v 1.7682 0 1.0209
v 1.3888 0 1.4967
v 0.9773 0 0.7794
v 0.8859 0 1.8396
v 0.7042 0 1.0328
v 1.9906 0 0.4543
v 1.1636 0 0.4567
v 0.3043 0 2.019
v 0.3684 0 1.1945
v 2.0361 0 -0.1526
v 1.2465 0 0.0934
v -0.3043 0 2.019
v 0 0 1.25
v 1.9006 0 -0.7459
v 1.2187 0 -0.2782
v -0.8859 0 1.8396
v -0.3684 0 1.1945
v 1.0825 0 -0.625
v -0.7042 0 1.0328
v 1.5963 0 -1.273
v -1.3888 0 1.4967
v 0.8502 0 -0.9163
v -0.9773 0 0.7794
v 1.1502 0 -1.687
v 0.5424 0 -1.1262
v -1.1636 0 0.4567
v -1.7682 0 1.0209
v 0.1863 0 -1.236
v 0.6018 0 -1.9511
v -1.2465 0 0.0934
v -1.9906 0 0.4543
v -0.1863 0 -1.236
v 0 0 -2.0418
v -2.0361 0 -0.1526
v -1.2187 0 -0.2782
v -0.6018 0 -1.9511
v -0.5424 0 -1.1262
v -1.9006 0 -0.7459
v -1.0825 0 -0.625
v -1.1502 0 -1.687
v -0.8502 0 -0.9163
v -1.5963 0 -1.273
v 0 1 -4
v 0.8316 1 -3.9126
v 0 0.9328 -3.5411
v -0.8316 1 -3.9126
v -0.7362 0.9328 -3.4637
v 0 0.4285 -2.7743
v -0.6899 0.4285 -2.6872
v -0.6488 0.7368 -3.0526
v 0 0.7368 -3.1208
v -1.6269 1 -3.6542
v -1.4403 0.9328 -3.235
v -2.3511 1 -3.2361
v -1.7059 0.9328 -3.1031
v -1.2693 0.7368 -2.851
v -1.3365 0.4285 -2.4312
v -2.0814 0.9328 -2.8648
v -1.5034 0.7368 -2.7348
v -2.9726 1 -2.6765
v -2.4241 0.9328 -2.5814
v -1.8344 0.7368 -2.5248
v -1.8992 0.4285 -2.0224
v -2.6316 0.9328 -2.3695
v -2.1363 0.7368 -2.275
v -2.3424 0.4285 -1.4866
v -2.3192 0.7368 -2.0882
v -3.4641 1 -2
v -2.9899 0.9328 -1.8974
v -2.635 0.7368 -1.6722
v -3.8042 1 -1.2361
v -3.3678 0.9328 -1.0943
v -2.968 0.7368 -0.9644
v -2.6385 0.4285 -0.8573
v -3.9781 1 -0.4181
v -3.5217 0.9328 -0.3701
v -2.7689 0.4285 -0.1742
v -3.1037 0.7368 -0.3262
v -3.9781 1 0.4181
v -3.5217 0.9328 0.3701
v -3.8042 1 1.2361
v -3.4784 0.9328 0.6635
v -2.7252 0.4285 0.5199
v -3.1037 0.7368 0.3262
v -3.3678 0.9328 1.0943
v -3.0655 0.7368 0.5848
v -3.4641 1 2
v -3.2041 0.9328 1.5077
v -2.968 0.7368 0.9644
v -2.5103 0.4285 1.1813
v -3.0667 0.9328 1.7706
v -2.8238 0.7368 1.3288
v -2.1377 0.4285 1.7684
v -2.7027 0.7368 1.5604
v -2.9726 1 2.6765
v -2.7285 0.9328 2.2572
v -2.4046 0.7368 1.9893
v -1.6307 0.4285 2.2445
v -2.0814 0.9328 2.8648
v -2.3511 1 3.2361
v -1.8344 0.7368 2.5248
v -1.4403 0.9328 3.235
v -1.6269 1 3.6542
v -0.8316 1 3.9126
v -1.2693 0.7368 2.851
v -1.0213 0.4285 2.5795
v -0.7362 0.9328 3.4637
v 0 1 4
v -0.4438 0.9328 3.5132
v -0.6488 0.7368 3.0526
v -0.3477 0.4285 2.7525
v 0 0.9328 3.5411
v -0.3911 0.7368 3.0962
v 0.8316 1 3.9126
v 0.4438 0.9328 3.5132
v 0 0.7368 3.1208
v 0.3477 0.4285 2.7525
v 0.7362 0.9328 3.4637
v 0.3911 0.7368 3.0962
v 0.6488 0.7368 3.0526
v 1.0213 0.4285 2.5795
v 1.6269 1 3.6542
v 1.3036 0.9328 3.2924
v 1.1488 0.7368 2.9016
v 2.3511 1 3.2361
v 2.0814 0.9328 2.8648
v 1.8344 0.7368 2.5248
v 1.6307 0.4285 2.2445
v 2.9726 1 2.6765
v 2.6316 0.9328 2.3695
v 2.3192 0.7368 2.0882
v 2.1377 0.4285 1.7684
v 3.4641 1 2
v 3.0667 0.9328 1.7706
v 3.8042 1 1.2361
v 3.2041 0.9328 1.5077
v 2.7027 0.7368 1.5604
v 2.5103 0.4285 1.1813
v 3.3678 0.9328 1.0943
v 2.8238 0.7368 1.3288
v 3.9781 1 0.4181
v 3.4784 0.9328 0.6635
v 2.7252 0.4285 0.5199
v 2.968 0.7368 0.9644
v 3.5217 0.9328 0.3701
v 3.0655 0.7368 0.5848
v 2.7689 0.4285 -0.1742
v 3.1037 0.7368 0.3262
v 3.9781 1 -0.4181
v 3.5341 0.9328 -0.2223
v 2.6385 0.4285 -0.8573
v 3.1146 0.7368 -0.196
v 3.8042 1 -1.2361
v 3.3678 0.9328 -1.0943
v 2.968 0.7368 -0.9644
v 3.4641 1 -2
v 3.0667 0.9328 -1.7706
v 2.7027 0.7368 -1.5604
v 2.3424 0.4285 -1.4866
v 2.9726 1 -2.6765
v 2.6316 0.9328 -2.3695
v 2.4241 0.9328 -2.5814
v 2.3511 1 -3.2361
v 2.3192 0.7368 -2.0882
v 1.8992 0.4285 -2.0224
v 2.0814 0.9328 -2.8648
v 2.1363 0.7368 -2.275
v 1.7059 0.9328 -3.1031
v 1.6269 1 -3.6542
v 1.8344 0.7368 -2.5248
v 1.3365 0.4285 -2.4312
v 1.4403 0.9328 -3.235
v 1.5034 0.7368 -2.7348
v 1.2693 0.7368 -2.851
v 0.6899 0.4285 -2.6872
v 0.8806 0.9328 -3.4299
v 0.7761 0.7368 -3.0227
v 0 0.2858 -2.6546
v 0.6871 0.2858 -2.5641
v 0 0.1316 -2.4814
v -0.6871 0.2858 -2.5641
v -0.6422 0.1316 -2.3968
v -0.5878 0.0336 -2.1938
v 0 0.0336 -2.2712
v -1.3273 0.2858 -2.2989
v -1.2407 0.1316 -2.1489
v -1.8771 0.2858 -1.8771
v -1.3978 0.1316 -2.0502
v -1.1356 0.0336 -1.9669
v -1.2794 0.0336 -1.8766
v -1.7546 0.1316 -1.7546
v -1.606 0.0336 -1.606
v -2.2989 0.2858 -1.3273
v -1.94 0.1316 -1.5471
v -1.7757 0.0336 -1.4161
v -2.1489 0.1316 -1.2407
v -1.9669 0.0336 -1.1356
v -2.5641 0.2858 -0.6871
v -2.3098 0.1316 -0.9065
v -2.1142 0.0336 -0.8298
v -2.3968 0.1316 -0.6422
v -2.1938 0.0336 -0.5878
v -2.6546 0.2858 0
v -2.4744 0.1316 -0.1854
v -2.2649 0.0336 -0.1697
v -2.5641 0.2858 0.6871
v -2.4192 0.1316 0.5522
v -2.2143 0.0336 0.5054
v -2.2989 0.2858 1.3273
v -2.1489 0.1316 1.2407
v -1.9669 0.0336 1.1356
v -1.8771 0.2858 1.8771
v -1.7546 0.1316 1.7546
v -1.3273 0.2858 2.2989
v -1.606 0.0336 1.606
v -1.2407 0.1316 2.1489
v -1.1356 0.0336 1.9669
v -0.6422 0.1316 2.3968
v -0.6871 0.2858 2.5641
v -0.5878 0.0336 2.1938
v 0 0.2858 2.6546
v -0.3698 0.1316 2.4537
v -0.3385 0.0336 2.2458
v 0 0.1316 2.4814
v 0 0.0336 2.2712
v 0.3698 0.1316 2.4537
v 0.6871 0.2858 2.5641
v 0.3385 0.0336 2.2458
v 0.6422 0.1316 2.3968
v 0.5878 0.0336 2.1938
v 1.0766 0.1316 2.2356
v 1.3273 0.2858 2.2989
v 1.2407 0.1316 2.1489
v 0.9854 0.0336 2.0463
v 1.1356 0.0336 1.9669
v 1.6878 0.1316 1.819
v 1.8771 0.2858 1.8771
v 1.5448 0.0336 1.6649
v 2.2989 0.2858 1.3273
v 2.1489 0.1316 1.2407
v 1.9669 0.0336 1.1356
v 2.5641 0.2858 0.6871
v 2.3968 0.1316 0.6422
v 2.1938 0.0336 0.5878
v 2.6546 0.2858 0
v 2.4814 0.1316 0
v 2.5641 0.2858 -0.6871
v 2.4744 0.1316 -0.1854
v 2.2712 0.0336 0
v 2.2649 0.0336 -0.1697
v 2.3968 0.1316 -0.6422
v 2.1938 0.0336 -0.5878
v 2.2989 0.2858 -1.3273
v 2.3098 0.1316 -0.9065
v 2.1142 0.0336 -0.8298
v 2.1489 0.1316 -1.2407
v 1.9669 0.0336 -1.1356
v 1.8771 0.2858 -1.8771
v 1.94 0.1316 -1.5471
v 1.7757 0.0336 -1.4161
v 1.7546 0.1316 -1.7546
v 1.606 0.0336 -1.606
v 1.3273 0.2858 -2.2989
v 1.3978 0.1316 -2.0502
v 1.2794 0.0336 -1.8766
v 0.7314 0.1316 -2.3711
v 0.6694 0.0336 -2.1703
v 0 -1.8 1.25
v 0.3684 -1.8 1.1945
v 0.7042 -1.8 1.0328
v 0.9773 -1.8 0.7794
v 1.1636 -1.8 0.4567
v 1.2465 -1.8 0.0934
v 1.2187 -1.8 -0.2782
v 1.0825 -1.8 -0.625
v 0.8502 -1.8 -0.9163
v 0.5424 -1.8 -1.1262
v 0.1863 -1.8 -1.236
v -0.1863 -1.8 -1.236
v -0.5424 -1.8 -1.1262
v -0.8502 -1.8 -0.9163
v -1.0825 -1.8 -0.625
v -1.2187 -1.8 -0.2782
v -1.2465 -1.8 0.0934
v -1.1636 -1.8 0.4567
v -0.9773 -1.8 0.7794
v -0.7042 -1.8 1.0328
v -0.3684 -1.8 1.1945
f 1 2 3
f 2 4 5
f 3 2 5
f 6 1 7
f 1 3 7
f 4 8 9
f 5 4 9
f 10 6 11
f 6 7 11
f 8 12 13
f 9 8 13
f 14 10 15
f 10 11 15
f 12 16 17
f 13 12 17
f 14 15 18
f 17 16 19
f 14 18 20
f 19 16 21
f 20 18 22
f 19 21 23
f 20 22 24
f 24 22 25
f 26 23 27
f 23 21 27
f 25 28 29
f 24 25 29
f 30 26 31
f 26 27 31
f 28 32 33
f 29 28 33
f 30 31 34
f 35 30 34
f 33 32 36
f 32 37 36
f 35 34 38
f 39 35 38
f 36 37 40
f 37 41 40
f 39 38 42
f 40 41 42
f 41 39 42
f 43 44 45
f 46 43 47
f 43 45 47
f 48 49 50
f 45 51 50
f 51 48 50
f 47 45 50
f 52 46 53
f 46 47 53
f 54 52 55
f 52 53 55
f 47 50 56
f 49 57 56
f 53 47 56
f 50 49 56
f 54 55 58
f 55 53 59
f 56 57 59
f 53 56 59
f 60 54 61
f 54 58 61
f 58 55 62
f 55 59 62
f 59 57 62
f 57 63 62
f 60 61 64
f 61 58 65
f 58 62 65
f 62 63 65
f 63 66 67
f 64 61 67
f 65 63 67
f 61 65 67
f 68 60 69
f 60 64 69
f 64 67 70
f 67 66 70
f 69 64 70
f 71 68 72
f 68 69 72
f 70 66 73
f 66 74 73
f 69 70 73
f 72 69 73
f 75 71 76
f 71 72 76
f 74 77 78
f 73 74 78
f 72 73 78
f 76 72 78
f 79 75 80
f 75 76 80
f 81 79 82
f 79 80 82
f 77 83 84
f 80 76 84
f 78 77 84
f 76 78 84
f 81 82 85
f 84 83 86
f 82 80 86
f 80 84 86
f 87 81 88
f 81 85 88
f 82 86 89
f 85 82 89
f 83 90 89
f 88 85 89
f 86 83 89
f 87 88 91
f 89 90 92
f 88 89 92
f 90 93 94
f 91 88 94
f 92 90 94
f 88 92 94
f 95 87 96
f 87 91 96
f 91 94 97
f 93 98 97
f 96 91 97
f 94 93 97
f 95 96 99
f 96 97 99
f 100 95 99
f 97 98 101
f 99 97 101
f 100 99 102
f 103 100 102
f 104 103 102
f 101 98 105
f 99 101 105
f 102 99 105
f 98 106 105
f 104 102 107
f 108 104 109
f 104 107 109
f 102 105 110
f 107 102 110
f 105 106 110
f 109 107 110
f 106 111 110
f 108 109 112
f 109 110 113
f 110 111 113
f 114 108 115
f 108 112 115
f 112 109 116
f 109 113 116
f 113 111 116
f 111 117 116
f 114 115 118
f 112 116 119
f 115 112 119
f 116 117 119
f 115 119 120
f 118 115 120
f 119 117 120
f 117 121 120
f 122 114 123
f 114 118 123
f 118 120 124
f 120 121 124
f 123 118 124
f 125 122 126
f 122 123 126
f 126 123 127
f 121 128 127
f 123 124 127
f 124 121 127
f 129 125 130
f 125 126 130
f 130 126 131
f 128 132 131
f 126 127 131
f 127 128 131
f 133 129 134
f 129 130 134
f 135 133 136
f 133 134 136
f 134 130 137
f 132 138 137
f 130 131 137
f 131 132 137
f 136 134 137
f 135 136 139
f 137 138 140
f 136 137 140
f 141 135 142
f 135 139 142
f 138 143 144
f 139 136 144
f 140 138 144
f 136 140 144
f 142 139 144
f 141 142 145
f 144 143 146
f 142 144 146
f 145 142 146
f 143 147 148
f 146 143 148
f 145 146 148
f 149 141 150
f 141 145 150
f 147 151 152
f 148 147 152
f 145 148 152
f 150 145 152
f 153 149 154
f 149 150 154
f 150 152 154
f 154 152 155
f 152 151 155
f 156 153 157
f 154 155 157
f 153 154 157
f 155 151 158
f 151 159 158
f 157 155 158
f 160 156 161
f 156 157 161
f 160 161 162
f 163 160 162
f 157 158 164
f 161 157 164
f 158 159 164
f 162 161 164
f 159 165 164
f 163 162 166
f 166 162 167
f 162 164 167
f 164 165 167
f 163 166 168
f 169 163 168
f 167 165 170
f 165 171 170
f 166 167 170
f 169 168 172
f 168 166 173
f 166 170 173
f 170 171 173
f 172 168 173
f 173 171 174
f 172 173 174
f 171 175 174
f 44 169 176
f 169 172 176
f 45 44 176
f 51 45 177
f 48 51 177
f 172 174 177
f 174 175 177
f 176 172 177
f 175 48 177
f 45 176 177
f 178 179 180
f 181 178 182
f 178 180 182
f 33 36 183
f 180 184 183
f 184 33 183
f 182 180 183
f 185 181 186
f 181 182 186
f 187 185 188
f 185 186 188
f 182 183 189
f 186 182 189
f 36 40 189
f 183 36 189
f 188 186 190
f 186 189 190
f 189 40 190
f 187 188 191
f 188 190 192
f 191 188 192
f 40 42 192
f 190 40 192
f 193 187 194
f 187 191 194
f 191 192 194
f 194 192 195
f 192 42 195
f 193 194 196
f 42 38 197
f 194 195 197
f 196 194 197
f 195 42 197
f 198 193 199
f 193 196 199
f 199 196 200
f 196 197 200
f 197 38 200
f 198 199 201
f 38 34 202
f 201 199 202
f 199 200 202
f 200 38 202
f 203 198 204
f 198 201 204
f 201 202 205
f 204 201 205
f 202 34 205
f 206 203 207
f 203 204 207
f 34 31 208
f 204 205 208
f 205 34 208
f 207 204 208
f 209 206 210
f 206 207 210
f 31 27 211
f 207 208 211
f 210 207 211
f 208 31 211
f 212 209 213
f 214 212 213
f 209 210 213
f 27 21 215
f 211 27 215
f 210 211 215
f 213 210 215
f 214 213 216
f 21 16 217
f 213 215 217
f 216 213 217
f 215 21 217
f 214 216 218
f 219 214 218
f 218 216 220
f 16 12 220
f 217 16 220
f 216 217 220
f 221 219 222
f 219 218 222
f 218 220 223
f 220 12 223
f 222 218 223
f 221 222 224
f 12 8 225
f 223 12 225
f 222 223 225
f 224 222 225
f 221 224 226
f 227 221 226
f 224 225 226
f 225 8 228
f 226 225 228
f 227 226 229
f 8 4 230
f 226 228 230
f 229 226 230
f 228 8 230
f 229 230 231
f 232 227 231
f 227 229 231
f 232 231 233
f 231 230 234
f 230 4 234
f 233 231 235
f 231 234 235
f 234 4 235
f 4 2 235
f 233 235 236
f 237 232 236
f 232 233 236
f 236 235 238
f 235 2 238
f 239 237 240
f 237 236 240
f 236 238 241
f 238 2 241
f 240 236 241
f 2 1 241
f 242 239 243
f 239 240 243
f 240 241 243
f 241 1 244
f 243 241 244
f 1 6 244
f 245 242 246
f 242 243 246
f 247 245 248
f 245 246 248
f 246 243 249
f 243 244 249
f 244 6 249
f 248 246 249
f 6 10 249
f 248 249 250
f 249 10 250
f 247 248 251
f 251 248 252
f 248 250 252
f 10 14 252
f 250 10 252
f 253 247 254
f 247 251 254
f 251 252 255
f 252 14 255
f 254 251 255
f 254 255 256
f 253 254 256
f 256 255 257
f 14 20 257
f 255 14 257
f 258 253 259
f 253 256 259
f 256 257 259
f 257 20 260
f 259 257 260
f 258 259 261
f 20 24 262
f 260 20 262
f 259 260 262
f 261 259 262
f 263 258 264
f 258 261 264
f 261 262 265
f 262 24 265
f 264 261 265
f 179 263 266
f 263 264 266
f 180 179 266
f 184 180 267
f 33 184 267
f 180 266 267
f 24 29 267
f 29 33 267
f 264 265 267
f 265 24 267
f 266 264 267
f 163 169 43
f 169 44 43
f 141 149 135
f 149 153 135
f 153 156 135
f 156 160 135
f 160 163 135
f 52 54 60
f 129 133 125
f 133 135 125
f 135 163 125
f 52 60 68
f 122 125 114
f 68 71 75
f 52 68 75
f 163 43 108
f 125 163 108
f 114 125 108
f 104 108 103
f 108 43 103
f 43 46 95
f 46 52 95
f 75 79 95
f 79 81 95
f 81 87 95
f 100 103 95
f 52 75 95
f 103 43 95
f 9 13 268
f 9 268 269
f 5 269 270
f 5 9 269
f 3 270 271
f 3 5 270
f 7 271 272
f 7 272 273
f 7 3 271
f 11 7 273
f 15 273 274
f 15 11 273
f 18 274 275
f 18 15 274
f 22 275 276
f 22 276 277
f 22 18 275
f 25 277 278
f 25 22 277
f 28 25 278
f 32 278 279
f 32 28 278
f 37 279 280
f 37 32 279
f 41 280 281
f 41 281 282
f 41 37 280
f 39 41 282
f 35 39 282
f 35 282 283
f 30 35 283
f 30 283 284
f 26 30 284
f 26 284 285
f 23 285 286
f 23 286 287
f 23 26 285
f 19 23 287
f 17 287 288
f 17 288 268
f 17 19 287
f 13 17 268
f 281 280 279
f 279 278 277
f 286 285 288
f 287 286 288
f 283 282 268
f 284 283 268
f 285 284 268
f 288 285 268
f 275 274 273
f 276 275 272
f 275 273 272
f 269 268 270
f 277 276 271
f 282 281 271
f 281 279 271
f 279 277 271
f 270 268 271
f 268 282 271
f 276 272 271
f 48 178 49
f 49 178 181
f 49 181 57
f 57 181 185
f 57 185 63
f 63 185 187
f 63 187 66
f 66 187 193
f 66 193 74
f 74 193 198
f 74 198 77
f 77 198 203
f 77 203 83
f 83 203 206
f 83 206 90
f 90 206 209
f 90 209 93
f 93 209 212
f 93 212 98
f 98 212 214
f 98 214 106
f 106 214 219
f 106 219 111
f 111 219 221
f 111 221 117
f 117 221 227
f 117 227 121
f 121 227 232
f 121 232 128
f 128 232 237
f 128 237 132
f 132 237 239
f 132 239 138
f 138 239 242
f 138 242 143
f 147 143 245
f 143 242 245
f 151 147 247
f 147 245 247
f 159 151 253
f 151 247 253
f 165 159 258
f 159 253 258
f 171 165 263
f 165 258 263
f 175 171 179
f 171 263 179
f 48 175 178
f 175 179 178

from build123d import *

# Parameters (mm, degrees)
SKETCH_2_R      = 1.25
EXTRUDE_1_DEPTH = 1.8


with BuildPart() as part:
    # Эскиз2 → Бобышка-Вытянуть1 (new body)
    with BuildSketch(Plane(origin=(0, 0, 0), x_dir=(1, 0, 0), z_dir=(0, 1, 0))):
        with Locations(Location((0, 0, 0), (0, 0, 270))):
            Circle(SKETCH_2_R)
    extrude(amount=-EXTRUDE_1_DEPTH)

    # Эскиз4 → Повернуть1 (revolve)
    with BuildSketch(Plane.XY, mode=Mode.PRIVATE) as revolve_1_sk:
        with BuildLine():
            Line((0, 0), (0, 1))
            Line((0, 1), (4, 1))
            ThreePointArc((4, 1), (3.323810781, 0.850092459), (2.774328891, 0.428460175))
            Line((2.774328891, 0.428460175), (2.654597544, 0.285769912))
            ThreePointArc((2.654597544, 0.285769912), (2.379856599, 0.07495377), (2.041761989, 0))
            Line((2.041761989, 0), (1.25, 0))
            Line((1.25, 0), (0, 0))
        make_face()
    revolve(revolve_1_sk.sketch.rotate(Axis((0, 0, 0), (0, 1, 0)), 90), axis=Axis((0, 0, 0), (0, 1, 0)))


solid = part.part
